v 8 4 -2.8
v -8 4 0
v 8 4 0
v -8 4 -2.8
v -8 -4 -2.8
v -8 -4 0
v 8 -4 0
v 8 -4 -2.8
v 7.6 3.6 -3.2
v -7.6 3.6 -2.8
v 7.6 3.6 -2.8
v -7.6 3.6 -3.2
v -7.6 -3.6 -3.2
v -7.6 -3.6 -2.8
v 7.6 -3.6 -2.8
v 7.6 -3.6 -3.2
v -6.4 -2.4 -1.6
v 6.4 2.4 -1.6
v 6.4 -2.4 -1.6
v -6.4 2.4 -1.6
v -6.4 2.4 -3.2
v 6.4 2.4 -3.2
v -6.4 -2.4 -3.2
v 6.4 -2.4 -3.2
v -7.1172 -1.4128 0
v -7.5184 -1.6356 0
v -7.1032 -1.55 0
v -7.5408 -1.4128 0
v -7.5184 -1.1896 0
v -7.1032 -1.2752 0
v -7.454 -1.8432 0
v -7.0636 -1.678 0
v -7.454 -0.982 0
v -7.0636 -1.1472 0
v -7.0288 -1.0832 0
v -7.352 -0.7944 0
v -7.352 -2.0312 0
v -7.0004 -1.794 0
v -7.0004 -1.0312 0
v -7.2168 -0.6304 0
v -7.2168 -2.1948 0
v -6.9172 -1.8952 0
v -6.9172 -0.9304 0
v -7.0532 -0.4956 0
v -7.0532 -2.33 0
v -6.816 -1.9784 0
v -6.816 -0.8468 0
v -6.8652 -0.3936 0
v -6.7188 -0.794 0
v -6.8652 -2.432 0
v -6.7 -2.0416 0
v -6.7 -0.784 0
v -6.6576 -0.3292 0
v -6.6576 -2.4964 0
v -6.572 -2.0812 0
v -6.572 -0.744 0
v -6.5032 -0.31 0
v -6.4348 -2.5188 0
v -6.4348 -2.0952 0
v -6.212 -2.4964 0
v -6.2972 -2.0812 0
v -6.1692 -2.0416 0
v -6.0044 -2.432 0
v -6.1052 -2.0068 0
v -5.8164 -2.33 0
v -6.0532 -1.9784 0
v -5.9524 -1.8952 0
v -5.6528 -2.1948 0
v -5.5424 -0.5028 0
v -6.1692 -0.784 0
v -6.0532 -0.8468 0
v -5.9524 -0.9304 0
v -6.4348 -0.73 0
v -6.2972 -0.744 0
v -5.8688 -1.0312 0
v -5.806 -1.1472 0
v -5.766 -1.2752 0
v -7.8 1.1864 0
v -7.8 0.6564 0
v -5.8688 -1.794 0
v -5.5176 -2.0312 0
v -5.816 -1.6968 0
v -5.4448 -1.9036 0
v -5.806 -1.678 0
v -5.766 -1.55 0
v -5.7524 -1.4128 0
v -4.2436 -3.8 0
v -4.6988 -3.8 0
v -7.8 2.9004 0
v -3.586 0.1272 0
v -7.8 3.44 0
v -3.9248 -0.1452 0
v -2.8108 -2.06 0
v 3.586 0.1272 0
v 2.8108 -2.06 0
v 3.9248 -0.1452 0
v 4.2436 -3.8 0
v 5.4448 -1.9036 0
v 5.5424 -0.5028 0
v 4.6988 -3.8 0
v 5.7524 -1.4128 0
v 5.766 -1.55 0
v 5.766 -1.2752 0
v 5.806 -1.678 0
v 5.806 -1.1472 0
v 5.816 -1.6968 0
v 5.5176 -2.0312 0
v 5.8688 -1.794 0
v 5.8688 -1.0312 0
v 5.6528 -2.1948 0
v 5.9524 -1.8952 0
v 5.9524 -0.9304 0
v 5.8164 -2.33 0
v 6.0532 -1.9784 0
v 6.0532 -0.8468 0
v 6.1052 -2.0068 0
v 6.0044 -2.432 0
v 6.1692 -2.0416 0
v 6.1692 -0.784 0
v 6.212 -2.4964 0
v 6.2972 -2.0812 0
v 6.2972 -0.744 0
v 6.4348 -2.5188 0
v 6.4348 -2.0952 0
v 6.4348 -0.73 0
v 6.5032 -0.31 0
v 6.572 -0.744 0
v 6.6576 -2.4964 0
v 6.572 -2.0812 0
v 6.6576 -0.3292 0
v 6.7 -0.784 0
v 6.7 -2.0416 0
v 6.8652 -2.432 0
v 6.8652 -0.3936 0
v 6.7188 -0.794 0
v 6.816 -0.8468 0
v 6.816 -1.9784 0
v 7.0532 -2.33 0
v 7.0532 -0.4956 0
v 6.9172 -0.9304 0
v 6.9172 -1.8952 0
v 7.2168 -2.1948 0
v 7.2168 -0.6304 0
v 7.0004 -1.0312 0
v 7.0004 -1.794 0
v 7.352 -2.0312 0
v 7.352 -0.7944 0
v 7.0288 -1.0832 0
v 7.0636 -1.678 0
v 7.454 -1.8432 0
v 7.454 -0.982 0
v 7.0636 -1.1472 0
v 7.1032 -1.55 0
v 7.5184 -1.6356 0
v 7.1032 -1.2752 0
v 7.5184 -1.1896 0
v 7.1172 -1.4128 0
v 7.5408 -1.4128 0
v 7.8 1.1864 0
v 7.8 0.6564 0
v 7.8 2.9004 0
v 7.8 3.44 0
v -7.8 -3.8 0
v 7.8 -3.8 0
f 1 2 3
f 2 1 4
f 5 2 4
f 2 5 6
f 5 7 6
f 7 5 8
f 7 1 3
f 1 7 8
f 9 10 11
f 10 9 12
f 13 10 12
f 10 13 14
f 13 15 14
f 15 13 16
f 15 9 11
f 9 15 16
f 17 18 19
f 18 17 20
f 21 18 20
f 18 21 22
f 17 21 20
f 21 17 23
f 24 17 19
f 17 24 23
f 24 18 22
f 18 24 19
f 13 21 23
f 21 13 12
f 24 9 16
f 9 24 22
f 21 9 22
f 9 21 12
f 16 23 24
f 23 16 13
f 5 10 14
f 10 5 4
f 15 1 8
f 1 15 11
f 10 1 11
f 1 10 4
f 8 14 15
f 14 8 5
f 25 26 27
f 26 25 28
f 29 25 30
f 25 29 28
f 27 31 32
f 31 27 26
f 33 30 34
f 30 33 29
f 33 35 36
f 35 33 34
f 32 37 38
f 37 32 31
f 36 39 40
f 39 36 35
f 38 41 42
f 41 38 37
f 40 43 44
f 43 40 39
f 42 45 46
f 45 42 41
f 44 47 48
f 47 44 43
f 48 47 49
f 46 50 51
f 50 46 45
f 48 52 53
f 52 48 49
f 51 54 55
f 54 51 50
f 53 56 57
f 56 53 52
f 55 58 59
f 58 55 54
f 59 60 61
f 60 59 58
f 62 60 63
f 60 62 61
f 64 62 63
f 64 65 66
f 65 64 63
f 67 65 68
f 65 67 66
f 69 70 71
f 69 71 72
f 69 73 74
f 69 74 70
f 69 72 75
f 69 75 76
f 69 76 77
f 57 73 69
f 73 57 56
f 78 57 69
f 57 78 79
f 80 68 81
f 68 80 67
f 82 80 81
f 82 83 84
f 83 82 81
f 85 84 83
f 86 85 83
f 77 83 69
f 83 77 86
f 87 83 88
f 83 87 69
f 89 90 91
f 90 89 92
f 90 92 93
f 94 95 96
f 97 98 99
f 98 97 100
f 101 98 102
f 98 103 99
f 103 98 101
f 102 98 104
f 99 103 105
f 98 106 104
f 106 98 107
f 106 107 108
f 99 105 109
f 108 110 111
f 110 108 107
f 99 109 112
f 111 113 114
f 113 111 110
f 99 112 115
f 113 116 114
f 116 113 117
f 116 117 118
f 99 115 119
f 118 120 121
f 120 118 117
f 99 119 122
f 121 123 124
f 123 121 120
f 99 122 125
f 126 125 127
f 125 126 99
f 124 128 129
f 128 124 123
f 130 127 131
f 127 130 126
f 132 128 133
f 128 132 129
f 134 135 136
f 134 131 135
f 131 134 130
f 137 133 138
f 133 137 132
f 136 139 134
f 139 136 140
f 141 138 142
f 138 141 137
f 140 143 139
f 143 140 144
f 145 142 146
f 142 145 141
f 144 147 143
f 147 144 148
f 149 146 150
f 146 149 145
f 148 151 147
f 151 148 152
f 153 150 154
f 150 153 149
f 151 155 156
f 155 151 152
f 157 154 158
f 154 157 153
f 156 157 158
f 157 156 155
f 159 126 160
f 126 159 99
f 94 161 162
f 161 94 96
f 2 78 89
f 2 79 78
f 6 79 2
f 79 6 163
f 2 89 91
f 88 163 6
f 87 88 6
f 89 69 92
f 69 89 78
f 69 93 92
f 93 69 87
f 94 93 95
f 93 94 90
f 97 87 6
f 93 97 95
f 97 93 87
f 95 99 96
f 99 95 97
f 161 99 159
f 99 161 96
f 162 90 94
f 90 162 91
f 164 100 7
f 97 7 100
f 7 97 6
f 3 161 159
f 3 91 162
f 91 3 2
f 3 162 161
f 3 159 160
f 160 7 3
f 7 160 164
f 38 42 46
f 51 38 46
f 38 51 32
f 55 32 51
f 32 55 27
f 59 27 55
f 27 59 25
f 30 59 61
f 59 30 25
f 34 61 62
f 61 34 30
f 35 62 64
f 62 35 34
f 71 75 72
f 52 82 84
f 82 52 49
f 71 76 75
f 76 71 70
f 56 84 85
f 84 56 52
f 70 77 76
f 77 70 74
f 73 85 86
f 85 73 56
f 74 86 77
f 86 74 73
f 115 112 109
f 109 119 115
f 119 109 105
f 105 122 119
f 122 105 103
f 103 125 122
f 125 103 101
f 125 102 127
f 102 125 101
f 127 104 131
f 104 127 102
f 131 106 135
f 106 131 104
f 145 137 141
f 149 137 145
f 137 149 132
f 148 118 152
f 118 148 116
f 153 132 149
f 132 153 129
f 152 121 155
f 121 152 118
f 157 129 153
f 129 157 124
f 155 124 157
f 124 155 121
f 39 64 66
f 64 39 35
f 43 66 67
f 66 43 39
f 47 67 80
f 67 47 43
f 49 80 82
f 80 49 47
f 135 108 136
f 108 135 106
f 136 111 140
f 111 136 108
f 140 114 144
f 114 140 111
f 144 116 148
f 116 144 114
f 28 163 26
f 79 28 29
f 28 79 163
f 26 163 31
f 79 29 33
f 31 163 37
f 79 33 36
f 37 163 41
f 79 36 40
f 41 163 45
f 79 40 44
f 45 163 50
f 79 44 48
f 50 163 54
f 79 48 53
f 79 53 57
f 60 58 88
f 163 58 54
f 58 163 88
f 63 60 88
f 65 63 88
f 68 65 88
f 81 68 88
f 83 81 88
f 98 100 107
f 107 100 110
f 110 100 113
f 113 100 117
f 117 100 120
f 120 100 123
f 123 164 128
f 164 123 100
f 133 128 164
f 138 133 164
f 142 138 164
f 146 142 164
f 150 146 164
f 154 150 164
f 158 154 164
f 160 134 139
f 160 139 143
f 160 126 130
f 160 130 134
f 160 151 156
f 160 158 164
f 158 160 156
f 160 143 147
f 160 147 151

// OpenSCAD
// file: ../p/box5.scad
use <../lib.scad>
function ldraw_lib__box5() = [
// 0 Box with 5 Faces and All Edges
// 0 Name: box5.dat
// 0 Author: James Jessiman
// 0 !LDRAW_ORG Primitive UPDATE 2012-01
// 0 !LICENSE Licensed under CC BY 2.0 and CC BY 4.0 : see CAreadme.txt
// 
// 0 BFC CERTIFY CCW
  [0,"BFC","CERTIFY"],
  [0,"BFC","CCW"],
// 
// 0 !HISTORY 2002-04-03 [sbliss] Modified for BFC compliance
// 0 !HISTORY 2002-04-25 [PTadmin] Official Update 2002-02
// 0 !HISTORY 2007-06-24 [PTadmin] Header formatted for Contributor Agreement
// 0 !HISTORY 2008-07-01 [PTadmin] Official Update 2008-01
// 0 !HISTORY 2012-02-16 [Philo] Changed to CCW
// 0 !HISTORY 2012-03-30 [PTadmin] Official Update 2012-01
// 
// 
// 2 24 1 1 1 -1 1 1
  [2,24,1,1,1,-1,1,1],
// 2 24 -1 1 1 -1 1 -1
  [2,24,-1,1,1,-1,1,-1],
// 2 24 -1 1 -1 1 1 -1
  [2,24,-1,1,-1,1,1,-1],
// 2 24 1 1 -1 1 1 1
  [2,24,1,1,-1,1,1,1],
// 2 24 1 0 1 -1 0 1
  [2,24,1,0,1,-1,0,1],
// 2 24 -1 0 1 -1 0 -1
  [2,24,-1,0,1,-1,0,-1],
// 2 24 -1 0 -1 1 0 -1
  [2,24,-1,0,-1,1,0,-1],
// 2 24 1 0 -1 1 0 1
  [2,24,1,0,-1,1,0,1],
// 2 24 1 0 1 1 1 1
  [2,24,1,0,1,1,1,1],
// 2 24 -1 0 1 -1 1 1
  [2,24,-1,0,1,-1,1,1],
// 2 24 1 0 -1 1 1 -1
  [2,24,1,0,-1,1,1,-1],
// 2 24 -1 0 -1 -1 1 -1
  [2,24,-1,0,-1,-1,1,-1],
// 4 16 -1 1 1 1 1 1 1 1 -1 -1 1 -1
  [4,16,-1,1,1,1,1,1,1,1,-1,-1,1,-1],
// 4 16 -1 1 1 -1 0 1 1 0 1 1 1 1
  [4,16,-1,1,1,-1,0,1,1,0,1,1,1,1],
// 4 16 -1 1 -1 -1 0 -1 -1 0 1 -1 1 1
  [4,16,-1,1,-1,-1,0,-1,-1,0,1,-1,1,1],
// 4 16 1 1 -1 1 0 -1 -1 0 -1 -1 1 -1
  [4,16,1,1,-1,1,0,-1,-1,0,-1,-1,1,-1],
// 4 16 1 1 1 1 0 1 1 0 -1 1 1 -1
  [4,16,1,1,1,1,0,1,1,0,-1,1,1,-1],
];
makepoly(ldraw_lib__box5(), line=0.2);
// file: ../p/box4.scad
use <../lib.scad>
function ldraw_lib__box4() = [
// 0 Box with 4 Faces (2 Parallel Pairs) and All Edges
// 0 Name: box4.dat
// 0 Author: James Jessiman
// 0 !LDRAW_ORG Primitive UPDATE 2012-01
// 0 !LICENSE Licensed under CC BY 2.0 and CC BY 4.0 : see CAreadme.txt
// 
// 0 BFC CERTIFY CCW
  [0,"BFC","CERTIFY"],
  [0,"BFC","CCW"],
// 
// 0 !HISTORY 2002-04-03 [sbliss] Modified for BFC compliance
// 0 !HISTORY 2002-04-25 [PTadmin] Official Update 2002-02
// 0 !HISTORY 2007-06-24 [PTadmin] Header formatted for Contributor Agreement
// 0 !HISTORY 2008-07-01 [PTadmin] Official Update 2008-01
// 0 !HISTORY 2012-02-16 [Philo] Changed to CCW
// 0 !HISTORY 2012-03-30 [PTadmin] Official Update 2012-01
// 
// 
// 2 24 1 1 1 -1 1 1
  [2,24,1,1,1,-1,1,1],
// 2 24 -1 1 1 -1 1 -1
  [2,24,-1,1,1,-1,1,-1],
// 2 24 -1 1 -1 1 1 -1
  [2,24,-1,1,-1,1,1,-1],
// 2 24 1 1 -1 1 1 1
  [2,24,1,1,-1,1,1,1],
// 2 24 1 0 1 -1 0 1
  [2,24,1,0,1,-1,0,1],
// 2 24 -1 0 1 -1 0 -1
  [2,24,-1,0,1,-1,0,-1],
// 2 24 -1 0 -1 1 0 -1
  [2,24,-1,0,-1,1,0,-1],
// 2 24 1 0 -1 1 0 1
  [2,24,1,0,-1,1,0,1],
// 2 24 1 0 1 1 1 1
  [2,24,1,0,1,1,1,1],
// 2 24 -1 0 1 -1 1 1
  [2,24,-1,0,1,-1,1,1],
// 2 24 1 0 -1 1 1 -1
  [2,24,1,0,-1,1,1,-1],
// 2 24 -1 0 -1 -1 1 -1
  [2,24,-1,0,-1,-1,1,-1],
// 4 16 -1 1 1 -1 0 1 1 0 1 1 1 1
  [4,16,-1,1,1,-1,0,1,1,0,1,1,1,1],
// 4 16 -1 1 -1 -1 0 -1 -1 0 1 -1 1 1
  [4,16,-1,1,-1,-1,0,-1,-1,0,1,-1,1,1],
// 4 16 1 1 -1 1 0 -1 -1 0 -1 -1 1 -1
  [4,16,1,1,-1,1,0,-1,-1,0,-1,-1,1,-1],
// 4 16 1 1 1 1 0 1 1 0 -1 1 1 -1
  [4,16,1,1,1,1,0,1,1,0,-1,1,1,-1],
];
makepoly(ldraw_lib__box4(), line=0.2);
// file: s/3069bs01.scad
use <../../lib.scad>
use <../../p/box4.scad>
use <../../p/box5.scad>
function ldraw_lib__s__3069bs01() = [
// 0 ~Tile  1 x  2 with Groove without Top Face
// 0 Name: s\3069bs01.dat
// 0 Author: Santeri Piippo [arezey]
// 0 !LDRAW_ORG Subpart UPDATE 2010-02
// 0 !LICENSE Licensed under CC BY 2.0 and CC BY 4.0 : see CAreadme.txt
// 
// 0 BFC CERTIFY CCW
  [0,"BFC","CERTIFY"],
  [0,"BFC","CCW"],
// 
// 0 !HISTORY 2010-07-05 [PTadmin] Official Update 2010-02
// 
// 
// 1 16 0 0 0 20 0 0 0 7 0 0 0 10 box4.dat
  [1,16,0,0,0,20,0,0,0,7,0,0,0,10, ldraw_lib__box4()],
// 1 16 0 7 0 19 0 0 0 1 0 0 0 9 box4.dat
  [1,16,0,7,0,19,0,0,0,1,0,0,0,9, ldraw_lib__box4()],
// 0 BFC INVERTNEXT
  [0,"BFC","INVERTNEXT"],
// 1 16 0 8 0 16 0 0 0 -4 0 0 0 6 box5.dat
  [1,16,0,8,0,16,0,0,0,-4,0,0,0,6, ldraw_lib__box5()],
// 4 16 -19 8 9 -16 8 6 -16 8 -6 -19 8 -9
  [4,16,-19,8,9,-16,8,6,-16,8,-6,-19,8,-9],
// 4 16 19 8 -9 16 8 -6 16 8 6 19 8 9
  [4,16,19,8,-9,16,8,-6,16,8,6,19,8,9],
// 4 16 19 8 9 16 8 6 -16 8 6 -19 8 9
  [4,16,19,8,9,16,8,6,-16,8,6,-19,8,9],
// 4 16 -19 8 -9 -16 8 -6 16 8 -6 19 8 -9
  [4,16,-19,8,-9,-16,8,-6,16,8,-6,19,8,-9],
// 4 16 -20 7 10 -19 7 9 -19 7 -9 -20 7 -10
  [4,16,-20,7,10,-19,7,9,-19,7,-9,-20,7,-10],
// 4 16 20 7 -10 19 7 -9 19 7 9 20 7 10
  [4,16,20,7,-10,19,7,-9,19,7,9,20,7,10],
// 4 16 20 7 10 19 7 9 -19 7 9 -20 7 10
  [4,16,20,7,10,19,7,9,-19,7,9,-20,7,10],
// 4 16 -20 7 -10 -19 7 -9 19 7 -9 20 7 -10
  [4,16,-20,7,-10,-19,7,-9,19,7,-9,20,7,-10],
// 0 //
];
makepoly(ldraw_lib__s__3069bs01(), line=0.2);
// main file
use <../lib.scad>
use <s/3069bs01.scad>
function ldraw_lib__3069bpz0() = [
// 0 Tile  1 x  2 with Black Lines and Medium Azure and White Circles on Silver Pattern
// 0 Name: 3069bpz0.dat
// 0 Author: Damien Roux [Darats]
// 0 !LDRAW_ORG Part UPDATE 2017-01
// 0 !LICENSE Licensed under CC BY 2.0 and CC BY 4.0 : see CAreadme.txt
// 
// 0 BFC CERTIFY CCW
  [0,"BFC","CERTIFY"],
  [0,"BFC","CCW"],
// 
// 0 !KEYWORDS Brickheadz, BrickLink 3069bpb557, Iron Man, Set 41590
// 
// 0 !HISTORY 2017-12-30 [PTadmin] Official Update 2017-01
// 
// 
// 1 16 0 0 0 1 0 0 0 1 0 0 0 1 s\3069bs01.dat
  [1,16,0,0,0,1,0,0,0,1,0,0,0,1, ldraw_lib__s__3069bs01()],
// 4 0 -17.758 0 -3.875 -17.793 0 -3.532 -18.852 0 -3.532 -18.796 0 -4.089
  [4,0,-17.758,0,-3.875,-17.793,0,-3.532,-18.852,0,-3.532,-18.796,0,-4.089],
// 4 0 -18.796 0 -2.974 -18.852 0 -3.532 -17.793 0 -3.532 -17.758 0 -3.188
  [4,0,-18.796,0,-2.974,-18.852,0,-3.532,-17.793,0,-3.532,-17.758,0,-3.188],
// 4 0 -17.659 0 -4.195 -17.758 0 -3.875 -18.796 0 -4.089 -18.635 0 -4.608
  [4,0,-17.659,0,-4.195,-17.758,0,-3.875,-18.796,0,-4.089,-18.635,0,-4.608],
// 4 0 -18.635 0 -2.455 -18.796 0 -2.974 -17.758 0 -3.188 -17.659 0 -2.868
  [4,0,-18.635,0,-2.455,-18.796,0,-2.974,-17.758,0,-3.188,-17.659,0,-2.868],
// 4 0 -18.38 0 -1.986 -18.635 0 -2.455 -17.659 0 -2.868 -17.572 0 -2.708
  [4,0,-18.38,0,-1.986,-18.635,0,-2.455,-17.659,0,-2.868,-17.572,0,-2.708],
// 4 0 -17.501 0 -4.485 -17.659 0 -4.195 -18.635 0 -4.608 -18.38 0 -5.078
  [4,0,-17.501,0,-4.485,-17.659,0,-4.195,-18.635,0,-4.608,-18.38,0,-5.078],
// 4 0 -18.38 0 -1.986 -17.572 0 -2.708 -17.501 0 -2.578 -18.042 0 -1.576
  [4,0,-18.38,0,-1.986,-17.572,0,-2.708,-17.501,0,-2.578,-18.042,0,-1.576],
// 4 0 -17.293 0 -4.738 -17.501 0 -4.485 -18.38 0 -5.078 -18.042 0 -5.487
  [4,0,-17.293,0,-4.738,-17.501,0,-4.485,-18.38,0,-5.078,-18.042,0,-5.487],
// 4 0 -18.042 0 -1.576 -17.501 0 -2.578 -17.293 0 -2.326 -17.633 0 -1.239
  [4,0,-18.042,0,-1.576,-17.501,0,-2.578,-17.293,0,-2.326,-17.633,0,-1.239],
// 4 0 -17.04 0 -4.946 -17.293 0 -4.738 -18.042 0 -5.487 -17.633 0 -5.825
  [4,0,-17.04,0,-4.946,-17.293,0,-4.738,-18.042,0,-5.487,-17.633,0,-5.825],
// 4 0 -17.633 0 -1.239 -17.293 0 -2.326 -17.04 0 -2.117 -17.163 0 -0.984
  [4,0,-17.633,0,-1.239,-17.293,0,-2.326,-17.04,0,-2.117,-17.163,0,-0.984],
// 3 0 -17.163 0 -0.984 -17.04 0 -2.117 -16.797 0 -1.985
  [3,0,-17.163,0,-0.984,-17.04,0,-2.117,-16.797,0,-1.985],
// 4 0 -16.75 0 -5.104 -17.04 0 -4.946 -17.633 0 -5.825 -17.163 0 -6.08
  [4,0,-16.75,0,-5.104,-17.04,0,-4.946,-17.633,0,-5.825,-17.163,0,-6.08],
// 4 0 -17.163 0 -0.984 -16.797 0 -1.985 -16.75 0 -1.96 -16.644 0 -0.823
  [4,0,-17.163,0,-0.984,-16.797,0,-1.985,-16.75,0,-1.96,-16.644,0,-0.823],
// 4 0 -16.43 0 -5.203 -16.75 0 -5.104 -17.163 0 -6.08 -16.644 0 -6.241
  [4,0,-16.43,0,-5.203,-16.75,0,-5.104,-17.163,0,-6.08,-16.644,0,-6.241],
// 4 0 -16.644 0 -0.823 -16.75 0 -1.96 -16.43 0 -1.86 -16.258 0 -0.775
  [4,0,-16.644,0,-0.823,-16.75,0,-1.96,-16.43,0,-1.86,-16.258,0,-0.775],
// 4 0 -16.087 0 -5.238 -16.43 0 -5.203 -16.644 0 -6.241 -16.087 0 -6.297
  [4,0,-16.087,0,-5.238,-16.43,0,-5.203,-16.644,0,-6.241,-16.087,0,-6.297],
// 4 0 -15.743 0 -5.203 -16.087 0 -5.238 -16.087 0 -6.297 -15.53 0 -6.241
  [4,0,-15.743,0,-5.203,-16.087,0,-5.238,-16.087,0,-6.297,-15.53,0,-6.241],
// 4 0 -15.423 0 -5.104 -15.743 0 -5.203 -15.53 0 -6.241 -15.011 0 -6.08
  [4,0,-15.423,0,-5.104,-15.743,0,-5.203,-15.53,0,-6.241,-15.011,0,-6.08],
// 3 0 -15.263 0 -5.017 -15.423 0 -5.104 -15.011 0 -6.08
  [3,0,-15.263,0,-5.017,-15.423,0,-5.104,-15.011,0,-6.08],
// 4 0 -15.133 0 -4.946 -15.263 0 -5.017 -15.011 0 -6.08 -14.541 0 -5.825
  [4,0,-15.133,0,-4.946,-15.263,0,-5.017,-15.011,0,-6.08,-14.541,0,-5.825],
// 4 0 -14.881 0 -4.738 -15.133 0 -4.946 -14.541 0 -5.825 -14.132 0 -5.487
  [4,0,-14.881,0,-4.738,-15.133,0,-4.946,-14.541,0,-5.825,-14.132,0,-5.487],
// 3 0 -13.856 0 -1.257 -15.423 0 -1.96 -15.133 0 -2.117
  [3,0,-13.856,0,-1.257,-15.423,0,-1.96,-15.133,0,-2.117],
// 3 0 -13.856 0 -1.257 -15.133 0 -2.117 -14.881 0 -2.326
  [3,0,-13.856,0,-1.257,-15.133,0,-2.117,-14.881,0,-2.326],
// 3 0 -13.856 0 -1.257 -16.087 0 -1.825 -15.743 0 -1.86
  [3,0,-13.856,0,-1.257,-16.087,0,-1.825,-15.743,0,-1.86],
// 3 0 -13.856 0 -1.257 -15.743 0 -1.86 -15.423 0 -1.96
  [3,0,-13.856,0,-1.257,-15.743,0,-1.86,-15.423,0,-1.96],
// 3 0 -13.856 0 -1.257 -14.881 0 -2.326 -14.672 0 -2.578
  [3,0,-13.856,0,-1.257,-14.881,0,-2.326,-14.672,0,-2.578],
// 3 0 -13.856 0 -1.257 -14.672 0 -2.578 -14.515 0 -2.868
  [3,0,-13.856,0,-1.257,-14.672,0,-2.578,-14.515,0,-2.868],
// 3 0 -13.856 0 -1.257 -14.515 0 -2.868 -14.415 0 -3.188
  [3,0,-13.856,0,-1.257,-14.515,0,-2.868,-14.415,0,-3.188],
// 4 0 -16.258 0 -0.775 -16.43 0 -1.86 -16.087 0 -1.825 -13.856 0 -1.257
  [4,0,-16.258,0,-0.775,-16.43,0,-1.86,-16.087,0,-1.825,-13.856,0,-1.257],
// 4 0 -16.258 0 -0.775 -13.856 0 -1.257 -19.5 0 2.966 -19.5 0 1.641
  [4,0,-16.258,0,-0.775,-13.856,0,-1.257,-19.5,0,2.966,-19.5,0,1.641],
// 4 0 -14.672 0 -4.485 -14.881 0 -4.738 -14.132 0 -5.487 -13.794 0 -5.078
  [4,0,-14.672,0,-4.485,-14.881,0,-4.738,-14.132,0,-5.487,-13.794,0,-5.078],
// 3 0 -14.54 0 -4.242 -14.672 0 -4.485 -13.794 0 -5.078
  [3,0,-14.54,0,-4.242,-14.672,0,-4.485,-13.794,0,-5.078],
// 4 0 -14.515 0 -4.195 -14.54 0 -4.242 -13.794 0 -5.078 -13.612 0 -4.759
  [4,0,-14.515,0,-4.195,-14.54,0,-4.242,-13.794,0,-5.078,-13.612,0,-4.759],
// 3 0 -14.415 0 -3.875 -14.515 0 -4.195 -13.612 0 -4.759
  [3,0,-14.415,0,-3.875,-14.515,0,-4.195,-13.612,0,-4.759],
// 3 0 -14.381 0 -3.532 -14.415 0 -3.875 -13.612 0 -4.759
  [3,0,-14.381,0,-3.532,-14.415,0,-3.875,-13.612,0,-4.759],
// 4 0 -13.856 0 -1.257 -14.415 0 -3.188 -14.381 0 -3.532 -13.612 0 -4.759
  [4,0,-13.856,0,-1.257,-14.415,0,-3.188,-14.381,0,-3.532,-13.612,0,-4.759],
// 4 0 -10.609 0 -9.5 -13.856 0 -1.257 -13.612 0 -4.759 -11.747 0 -9.5
  [4,0,-10.609,0,-9.5,-13.856,0,-1.257,-13.612,0,-4.759,-11.747,0,-9.5],
// 4 0 -9.812 0 -0.363 -8.965 0 0.318 -19.5 0 8.6 -19.5 0 7.251
  [4,0,-9.812,0,-0.363,-8.965,0,0.318,-19.5,0,8.6,-19.5,0,7.251],
// 3 0 -8.965 0 0.318 -9.812 0 -0.363 -7.027 0 -5.15
  [3,0,-8.965,0,0.318,-9.812,0,-0.363,-7.027,0,-5.15],
// 3 0 8.965 0 0.318 7.027 0 -5.15 9.812 0 -0.363
  [3,0,8.965,0,0.318,7.027,0,-5.15,9.812,0,-0.363],
// 4 0 13.612 0 -4.759 13.856 0 -1.257 10.609 0 -9.5 11.747 0 -9.5
  [4,0,13.612,0,-4.759,13.856,0,-1.257,10.609,0,-9.5,11.747,0,-9.5],
// 3 0 14.381 0 -3.532 13.612 0 -4.759 14.415 0 -3.875
  [3,0,14.381,0,-3.532,13.612,0,-4.759,14.415,0,-3.875],
// 4 0 14.381 0 -3.532 14.415 0 -3.188 13.856 0 -1.257 13.612 0 -4.759
  [4,0,14.381,0,-3.532,14.415,0,-3.188,13.856,0,-1.257,13.612,0,-4.759],
// 3 0 14.415 0 -3.875 13.612 0 -4.759 14.515 0 -4.195
  [3,0,14.415,0,-3.875,13.612,0,-4.759,14.515,0,-4.195],
// 3 0 13.856 0 -1.257 14.415 0 -3.188 14.515 0 -2.868
  [3,0,13.856,0,-1.257,14.415,0,-3.188,14.515,0,-2.868],
// 4 0 13.794 0 -5.078 14.54 0 -4.242 14.515 0 -4.195 13.612 0 -4.759
  [4,0,13.794,0,-5.078,14.54,0,-4.242,14.515,0,-4.195,13.612,0,-4.759],
// 3 0 14.54 0 -4.242 13.794 0 -5.078 14.672 0 -4.485
  [3,0,14.54,0,-4.242,13.794,0,-5.078,14.672,0,-4.485],
// 3 0 13.856 0 -1.257 14.515 0 -2.868 14.672 0 -2.578
  [3,0,13.856,0,-1.257,14.515,0,-2.868,14.672,0,-2.578],
// 4 0 14.132 0 -5.487 14.881 0 -4.738 14.672 0 -4.485 13.794 0 -5.078
  [4,0,14.132,0,-5.487,14.881,0,-4.738,14.672,0,-4.485,13.794,0,-5.078],
// 3 0 13.856 0 -1.257 14.672 0 -2.578 14.881 0 -2.326
  [3,0,13.856,0,-1.257,14.672,0,-2.578,14.881,0,-2.326],
// 4 0 14.541 0 -5.825 15.133 0 -4.946 14.881 0 -4.738 14.132 0 -5.487
  [4,0,14.541,0,-5.825,15.133,0,-4.946,14.881,0,-4.738,14.132,0,-5.487],
// 3 0 13.856 0 -1.257 14.881 0 -2.326 15.133 0 -2.117
  [3,0,13.856,0,-1.257,14.881,0,-2.326,15.133,0,-2.117],
// 4 0 15.011 0 -6.08 15.263 0 -5.017 15.133 0 -4.946 14.541 0 -5.825
  [4,0,15.011,0,-6.08,15.263,0,-5.017,15.133,0,-4.946,14.541,0,-5.825],
// 3 0 15.263 0 -5.017 15.011 0 -6.08 15.423 0 -5.104
  [3,0,15.263,0,-5.017,15.011,0,-6.08,15.423,0,-5.104],
// 3 0 13.856 0 -1.257 15.133 0 -2.117 15.423 0 -1.96
  [3,0,13.856,0,-1.257,15.133,0,-2.117,15.423,0,-1.96],
// 4 0 15.53 0 -6.241 15.743 0 -5.203 15.423 0 -5.104 15.011 0 -6.08
  [4,0,15.53,0,-6.241,15.743,0,-5.203,15.423,0,-5.104,15.011,0,-6.08],
// 3 0 13.856 0 -1.257 15.423 0 -1.96 15.743 0 -1.86
  [3,0,13.856,0,-1.257,15.423,0,-1.96,15.743,0,-1.86],
// 4 0 16.087 0 -6.297 16.087 0 -5.238 15.743 0 -5.203 15.53 0 -6.241
  [4,0,16.087,0,-6.297,16.087,0,-5.238,15.743,0,-5.203,15.53,0,-6.241],
// 3 0 13.856 0 -1.257 15.743 0 -1.86 16.087 0 -1.825
  [3,0,13.856,0,-1.257,15.743,0,-1.86,16.087,0,-1.825],
// 4 0 16.087 0 -1.825 16.43 0 -1.86 16.258 0 -0.775 13.856 0 -1.257
  [4,0,16.087,0,-1.825,16.43,0,-1.86,16.258,0,-0.775,13.856,0,-1.257],
// 4 0 16.644 0 -6.241 16.43 0 -5.203 16.087 0 -5.238 16.087 0 -6.297
  [4,0,16.644,0,-6.241,16.43,0,-5.203,16.087,0,-5.238,16.087,0,-6.297],
// 4 0 16.43 0 -1.86 16.75 0 -1.96 16.644 0 -0.823 16.258 0 -0.775
  [4,0,16.43,0,-1.86,16.75,0,-1.96,16.644,0,-0.823,16.258,0,-0.775],
// 4 0 17.163 0 -6.08 16.75 0 -5.104 16.43 0 -5.203 16.644 0 -6.241
  [4,0,17.163,0,-6.08,16.75,0,-5.104,16.43,0,-5.203,16.644,0,-6.241],
// 3 0 17.163 0 -0.984 16.797 0 -1.985 17.04 0 -2.117
  [3,0,17.163,0,-0.984,16.797,0,-1.985,17.04,0,-2.117],
// 4 0 16.75 0 -1.96 16.797 0 -1.985 17.163 0 -0.984 16.644 0 -0.823
  [4,0,16.75,0,-1.96,16.797,0,-1.985,17.163,0,-0.984,16.644,0,-0.823],
// 4 0 17.633 0 -5.825 17.04 0 -4.946 16.75 0 -5.104 17.163 0 -6.08
  [4,0,17.633,0,-5.825,17.04,0,-4.946,16.75,0,-5.104,17.163,0,-6.08],
// 4 0 17.04 0 -2.117 17.293 0 -2.326 17.633 0 -1.239 17.163 0 -0.984
  [4,0,17.04,0,-2.117,17.293,0,-2.326,17.633,0,-1.239,17.163,0,-0.984],
// 4 0 18.042 0 -5.487 17.293 0 -4.738 17.04 0 -4.946 17.633 0 -5.825
  [4,0,18.042,0,-5.487,17.293,0,-4.738,17.04,0,-4.946,17.633,0,-5.825],
// 4 0 17.293 0 -2.326 17.501 0 -2.578 18.042 0 -1.576 17.633 0 -1.239
  [4,0,17.293,0,-2.326,17.501,0,-2.578,18.042,0,-1.576,17.633,0,-1.239],
// 4 0 18.38 0 -5.078 17.501 0 -4.485 17.293 0 -4.738 18.042 0 -5.487
  [4,0,18.38,0,-5.078,17.501,0,-4.485,17.293,0,-4.738,18.042,0,-5.487],
// 4 0 17.501 0 -2.578 17.572 0 -2.708 18.38 0 -1.986 18.042 0 -1.576
  [4,0,17.501,0,-2.578,17.572,0,-2.708,18.38,0,-1.986,18.042,0,-1.576],
// 4 0 18.635 0 -4.608 17.659 0 -4.195 17.501 0 -4.485 18.38 0 -5.078
  [4,0,18.635,0,-4.608,17.659,0,-4.195,17.501,0,-4.485,18.38,0,-5.078],
// 4 0 17.659 0 -2.868 18.635 0 -2.455 18.38 0 -1.986 17.572 0 -2.708
  [4,0,17.659,0,-2.868,18.635,0,-2.455,18.38,0,-1.986,17.572,0,-2.708],
// 4 0 18.796 0 -4.089 17.758 0 -3.875 17.659 0 -4.195 18.635 0 -4.608
  [4,0,18.796,0,-4.089,17.758,0,-3.875,17.659,0,-4.195,18.635,0,-4.608],
// 4 0 17.758 0 -3.188 18.796 0 -2.974 18.635 0 -2.455 17.659 0 -2.868
  [4,0,17.758,0,-3.188,18.796,0,-2.974,18.635,0,-2.455,17.659,0,-2.868],
// 4 0 18.852 0 -3.532 17.793 0 -3.532 17.758 0 -3.875 18.796 0 -4.089
  [4,0,18.852,0,-3.532,17.793,0,-3.532,17.758,0,-3.875,18.796,0,-4.089],
// 4 0 17.793 0 -3.532 18.852 0 -3.532 18.796 0 -2.974 17.758 0 -3.188
  [4,0,17.793,0,-3.532,18.852,0,-3.532,18.796,0,-2.974,17.758,0,-3.188],
// 4 0 19.5 0 2.966 13.856 0 -1.257 16.258 0 -0.775 19.5 0 1.641
  [4,0,19.5,0,2.966,13.856,0,-1.257,16.258,0,-0.775,19.5,0,1.641],
// 4 0 19.5 0 8.6 8.965 0 0.318 9.812 0 -0.363 19.5 0 7.251
  [4,0,19.5,0,8.6,8.965,0,0.318,9.812,0,-0.363,19.5,0,7.251],
// 3 16 -20 0 10 -19.5 0 2.966 -19.5 0 7.251
  [3,16,-20,0,10,-19.5,0,2.966,-19.5,0,7.251],
// 3 16 -20 0 10 -19.5 0 1.641 -19.5 0 2.966
  [3,16,-20,0,10,-19.5,0,1.641,-19.5,0,2.966],
// 4 16 -20 0 -10 -19.5 0 -9.5 -19.5 0 1.641 -20 0 10
  [4,16,-20,0,-10,-19.5,0,-9.5,-19.5,0,1.641,-20,0,10],
// 3 16 -20 0 10 -19.5 0 7.251 -19.5 0 8.6
  [3,16,-20,0,10,-19.5,0,7.251,-19.5,0,8.6],
// 3 16 -11.747 0 -9.5 -19.5 0 -9.5 -20 0 -10
  [3,16,-11.747,0,-9.5,-19.5,0,-9.5,-20,0,-10],
// 3 16 -10.609 0 -9.5 -11.747 0 -9.5 -20 0 -10
  [3,16,-10.609,0,-9.5,-11.747,0,-9.5,-20,0,-10],
// 4 16 -9.812 0 -0.363 -19.5 0 7.251 -19.5 0 2.966 -13.856 0 -1.257
  [4,16,-9.812,0,-0.363,-19.5,0,7.251,-19.5,0,2.966,-13.856,0,-1.257],
// 4 16 -7.027 0 -5.15 -9.812 0 -0.363 -13.856 0 -1.257 -10.609 0 -9.5
  [4,16,-7.027,0,-5.15,-9.812,0,-0.363,-13.856,0,-1.257,-10.609,0,-9.5],
// 4 16 8.965 0 0.318 -8.965 0 0.318 -7.027 0 -5.15 7.027 0 -5.15
  [4,16,8.965,0,0.318,-8.965,0,0.318,-7.027,0,-5.15,7.027,0,-5.15],
// 3 16 10.609 0 -9.5 -10.609 0 -9.5 -20 0 -10
  [3,16,10.609,0,-9.5,-10.609,0,-9.5,-20,0,-10],
// 4 16 7.027 0 -5.15 -7.027 0 -5.15 -10.609 0 -9.5 10.609 0 -9.5
  [4,16,7.027,0,-5.15,-7.027,0,-5.15,-10.609,0,-9.5,10.609,0,-9.5],
// 4 16 13.856 0 -1.257 9.812 0 -0.363 7.027 0 -5.15 10.609 0 -9.5
  [4,16,13.856,0,-1.257,9.812,0,-0.363,7.027,0,-5.15,10.609,0,-9.5],
// 4 16 19.5 0 2.966 19.5 0 7.251 9.812 0 -0.363 13.856 0 -1.257
  [4,16,19.5,0,2.966,19.5,0,7.251,9.812,0,-0.363,13.856,0,-1.257],
// 4 16 19.5 0 8.6 -19.5 0 8.6 -8.965 0 0.318 8.965 0 0.318
  [4,16,19.5,0,8.6,-19.5,0,8.6,-8.965,0,0.318,8.965,0,0.318],
// 3 16 19.5 0 -9.5 11.747 0 -9.5 20 0 -10
  [3,16,19.5,0,-9.5,11.747,0,-9.5,20,0,-10],
// 4 16 20 0 -10 11.747 0 -9.5 10.609 0 -9.5 -20 0 -10
  [4,16,20,0,-10,11.747,0,-9.5,10.609,0,-9.5,-20,0,-10],
// 3 16 20 0 10 19.5 0 7.251 19.5 0 2.966
  [3,16,20,0,10,19.5,0,7.251,19.5,0,2.966],
// 4 16 20 0 10 -20 0 10 -19.5 0 8.6 19.5 0 8.6
  [4,16,20,0,10,-20,0,10,-19.5,0,8.6,19.5,0,8.6],
// 3 16 20 0 10 19.5 0 8.6 19.5 0 7.251
  [3,16,20,0,10,19.5,0,8.6,19.5,0,7.251],
// 3 16 20 0 10 19.5 0 2.966 19.5 0 1.641
  [3,16,20,0,10,19.5,0,2.966,19.5,0,1.641],
// 4 16 19.5 0 1.641 19.5 0 -9.5 20 0 -10 20 0 10
  [4,16,19.5,0,1.641,19.5,0,-9.5,20,0,-10,20,0,10],
// 3 322 -17.501 0 -4.485 -17.293 0 -4.738 -17.04 0 -4.946
  [3,322,-17.501,0,-4.485,-17.293,0,-4.738,-17.04,0,-4.946],
// 4 322 -16.75 0 -5.104 -17.659 0 -4.195 -17.501 0 -4.485 -17.04 0 -4.946
  [4,322,-16.75,0,-5.104,-17.659,0,-4.195,-17.501,0,-4.485,-17.04,0,-4.946],
// 4 322 -16.43 0 -5.203 -17.758 0 -3.875 -17.659 0 -4.195 -16.75 0 -5.104
  [4,322,-16.43,0,-5.203,-17.758,0,-3.875,-17.659,0,-4.195,-16.75,0,-5.104],
// 4 322 -16.087 0 -5.238 -17.793 0 -3.532 -17.758 0 -3.875 -16.43 0 -5.203
  [4,322,-16.087,0,-5.238,-17.793,0,-3.532,-17.758,0,-3.875,-16.43,0,-5.203],
// 4 322 -15.743 0 -5.203 -17.758 0 -3.188 -17.793 0 -3.532 -16.087 0 -5.238
  [4,322,-15.743,0,-5.203,-17.758,0,-3.188,-17.793,0,-3.532,-16.087,0,-5.238],
// 4 322 -15.423 0 -5.104 -17.659 0 -2.868 -17.758 0 -3.188 -15.743 0 -5.203
  [4,322,-15.423,0,-5.104,-17.659,0,-2.868,-17.758,0,-3.188,-15.743,0,-5.203],
// 4 322 -15.263 0 -5.017 -17.572 0 -2.708 -17.659 0 -2.868 -15.423 0 -5.104
  [4,322,-15.263,0,-5.017,-17.572,0,-2.708,-17.659,0,-2.868,-15.423,0,-5.104],
// 3 322 -15.133 0 -2.117 -14.672 0 -2.578 -14.881 0 -2.326
  [3,322,-15.133,0,-2.117,-14.672,0,-2.578,-14.881,0,-2.326],
// 4 322 -16.75 0 -1.96 -16.797 0 -1.985 -14.54 0 -4.242 -14.515 0 -4.195
  [4,322,-16.75,0,-1.96,-16.797,0,-1.985,-14.54,0,-4.242,-14.515,0,-4.195],
// 4 322 -15.133 0 -2.117 -15.423 0 -1.96 -14.515 0 -2.868 -14.672 0 -2.578
  [4,322,-15.133,0,-2.117,-15.423,0,-1.96,-14.515,0,-2.868,-14.672,0,-2.578],
// 4 322 -16.43 0 -1.86 -16.75 0 -1.96 -14.515 0 -4.195 -14.415 0 -3.875
  [4,322,-16.43,0,-1.86,-16.75,0,-1.96,-14.515,0,-4.195,-14.415,0,-3.875],
// 4 322 -15.423 0 -1.96 -15.743 0 -1.86 -14.415 0 -3.188 -14.515 0 -2.868
  [4,322,-15.423,0,-1.96,-15.743,0,-1.86,-14.415,0,-3.188,-14.515,0,-2.868],
// 4 322 -16.087 0 -1.825 -16.43 0 -1.86 -14.415 0 -3.875 -14.381 0 -3.532
  [4,322,-16.087,0,-1.825,-16.43,0,-1.86,-14.415,0,-3.875,-14.381,0,-3.532],
// 4 322 -15.743 0 -1.86 -16.087 0 -1.825 -14.381 0 -3.532 -14.415 0 -3.188
  [4,322,-15.743,0,-1.86,-16.087,0,-1.825,-14.381,0,-3.532,-14.415,0,-3.188],
// 3 322 15.133 0 -2.117 14.881 0 -2.326 14.672 0 -2.578
  [3,322,15.133,0,-2.117,14.881,0,-2.326,14.672,0,-2.578],
// 4 322 14.515 0 -2.868 15.423 0 -1.96 15.133 0 -2.117 14.672 0 -2.578
  [4,322,14.515,0,-2.868,15.423,0,-1.96,15.133,0,-2.117,14.672,0,-2.578],
// 4 322 14.415 0 -3.188 15.743 0 -1.86 15.423 0 -1.96 14.515 0 -2.868
  [4,322,14.415,0,-3.188,15.743,0,-1.86,15.423,0,-1.96,14.515,0,-2.868],
// 4 322 14.381 0 -3.532 16.087 0 -1.825 15.743 0 -1.86 14.415 0 -3.188
  [4,322,14.381,0,-3.532,16.087,0,-1.825,15.743,0,-1.86,14.415,0,-3.188],
// 4 322 14.415 0 -3.875 16.43 0 -1.86 16.087 0 -1.825 14.381 0 -3.532
  [4,322,14.415,0,-3.875,16.43,0,-1.86,16.087,0,-1.825,14.381,0,-3.532],
// 4 322 14.515 0 -4.195 16.75 0 -1.96 16.43 0 -1.86 14.415 0 -3.875
  [4,322,14.515,0,-4.195,16.75,0,-1.96,16.43,0,-1.86,14.415,0,-3.875],
// 4 322 14.54 0 -4.242 16.797 0 -1.985 16.75 0 -1.96 14.515 0 -4.195
  [4,322,14.54,0,-4.242,16.797,0,-1.985,16.75,0,-1.96,14.515,0,-4.195],
// 3 322 17.501 0 -4.485 17.04 0 -4.946 17.293 0 -4.738
  [3,322,17.501,0,-4.485,17.04,0,-4.946,17.293,0,-4.738],
// 4 322 17.501 0 -4.485 17.659 0 -4.195 16.75 0 -5.104 17.04 0 -4.946
  [4,322,17.501,0,-4.485,17.659,0,-4.195,16.75,0,-5.104,17.04,0,-4.946],
// 4 322 17.659 0 -2.868 17.572 0 -2.708 15.263 0 -5.017 15.423 0 -5.104
  [4,322,17.659,0,-2.868,17.572,0,-2.708,15.263,0,-5.017,15.423,0,-5.104],
// 4 322 17.659 0 -4.195 17.758 0 -3.875 16.43 0 -5.203 16.75 0 -5.104
  [4,322,17.659,0,-4.195,17.758,0,-3.875,16.43,0,-5.203,16.75,0,-5.104],
// 4 322 17.758 0 -3.188 17.659 0 -2.868 15.423 0 -5.104 15.743 0 -5.203
  [4,322,17.758,0,-3.188,17.659,0,-2.868,15.423,0,-5.104,15.743,0,-5.203],
// 4 322 17.758 0 -3.875 17.793 0 -3.532 16.087 0 -5.238 16.43 0 -5.203
  [4,322,17.758,0,-3.875,17.793,0,-3.532,16.087,0,-5.238,16.43,0,-5.203],
// 4 322 17.793 0 -3.532 17.758 0 -3.188 15.743 0 -5.203 16.087 0 -5.238
  [4,322,17.793,0,-3.532,17.758,0,-3.188,15.743,0,-5.203,16.087,0,-5.238],
// 4 15 -15.263 0 -5.017 -15.133 0 -4.946 -17.501 0 -2.578 -17.572 0 -2.708
  [4,15,-15.263,0,-5.017,-15.133,0,-4.946,-17.501,0,-2.578,-17.572,0,-2.708],
// 4 15 -15.133 0 -4.946 -14.881 0 -4.738 -17.293 0 -2.326 -17.501 0 -2.578
  [4,15,-15.133,0,-4.946,-14.881,0,-4.738,-17.293,0,-2.326,-17.501,0,-2.578],
// 4 15 -14.881 0 -4.738 -14.672 0 -4.485 -17.04 0 -2.117 -17.293 0 -2.326
  [4,15,-14.881,0,-4.738,-14.672,0,-4.485,-17.04,0,-2.117,-17.293,0,-2.326],
// 4 15 -14.672 0 -4.485 -14.54 0 -4.242 -16.797 0 -1.985 -17.04 0 -2.117
  [4,15,-14.672,0,-4.485,-14.54,0,-4.242,-16.797,0,-1.985,-17.04,0,-2.117],
// 4 15 16.797 0 -1.985 14.54 0 -4.242 14.672 0 -4.485 17.04 0 -2.117
  [4,15,16.797,0,-1.985,14.54,0,-4.242,14.672,0,-4.485,17.04,0,-2.117],
// 4 15 17.04 0 -2.117 14.672 0 -4.485 14.881 0 -4.738 17.293 0 -2.326
  [4,15,17.04,0,-2.117,14.672,0,-4.485,14.881,0,-4.738,17.293,0,-2.326],
// 4 15 17.293 0 -2.326 14.881 0 -4.738 15.133 0 -4.946 17.501 0 -2.578
  [4,15,17.293,0,-2.326,14.881,0,-4.738,15.133,0,-4.946,17.501,0,-2.578],
// 4 15 17.501 0 -2.578 15.133 0 -4.946 15.263 0 -5.017 17.572 0 -2.708
  [4,15,17.501,0,-2.578,15.133,0,-4.946,15.263,0,-5.017,17.572,0,-2.708],
// 3 80 -18.852 0 -3.532 -19.5 0 -9.5 -18.796 0 -4.089
  [3,80,-18.852,0,-3.532,-19.5,0,-9.5,-18.796,0,-4.089],
// 4 80 -18.852 0 -3.532 -18.796 0 -2.974 -19.5 0 1.641 -19.5 0 -9.5
  [4,80,-18.852,0,-3.532,-18.796,0,-2.974,-19.5,0,1.641,-19.5,0,-9.5],
// 3 80 -18.796 0 -4.089 -19.5 0 -9.5 -18.635 0 -4.608
  [3,80,-18.796,0,-4.089,-19.5,0,-9.5,-18.635,0,-4.608],
// 3 80 -19.5 0 1.641 -18.796 0 -2.974 -18.635 0 -2.455
  [3,80,-19.5,0,1.641,-18.796,0,-2.974,-18.635,0,-2.455],
// 3 80 -18.635 0 -4.608 -19.5 0 -9.5 -18.38 0 -5.078
  [3,80,-18.635,0,-4.608,-19.5,0,-9.5,-18.38,0,-5.078],
// 3 80 -19.5 0 1.641 -18.635 0 -2.455 -18.38 0 -1.986
  [3,80,-19.5,0,1.641,-18.635,0,-2.455,-18.38,0,-1.986],
// 3 80 -18.38 0 -5.078 -19.5 0 -9.5 -18.042 0 -5.487
  [3,80,-18.38,0,-5.078,-19.5,0,-9.5,-18.042,0,-5.487],
// 3 80 -19.5 0 1.641 -18.38 0 -1.986 -18.042 0 -1.576
  [3,80,-19.5,0,1.641,-18.38,0,-1.986,-18.042,0,-1.576],
// 3 80 -18.042 0 -5.487 -19.5 0 -9.5 -17.633 0 -5.825
  [3,80,-18.042,0,-5.487,-19.5,0,-9.5,-17.633,0,-5.825],
// 3 80 -19.5 0 1.641 -18.042 0 -1.576 -17.633 0 -1.239
  [3,80,-19.5,0,1.641,-18.042,0,-1.576,-17.633,0,-1.239],
// 3 80 -17.633 0 -5.825 -19.5 0 -9.5 -17.163 0 -6.08
  [3,80,-17.633,0,-5.825,-19.5,0,-9.5,-17.163,0,-6.08],
// 3 80 -19.5 0 1.641 -17.633 0 -1.239 -17.163 0 -0.984
  [3,80,-19.5,0,1.641,-17.633,0,-1.239,-17.163,0,-0.984],
// 3 80 -17.163 0 -6.08 -19.5 0 -9.5 -16.644 0 -6.241
  [3,80,-17.163,0,-6.08,-19.5,0,-9.5,-16.644,0,-6.241],
// 3 80 -19.5 0 1.641 -17.163 0 -0.984 -16.644 0 -0.823
  [3,80,-19.5,0,1.641,-17.163,0,-0.984,-16.644,0,-0.823],
// 3 80 -19.5 0 1.641 -16.644 0 -0.823 -16.258 0 -0.775
  [3,80,-19.5,0,1.641,-16.644,0,-0.823,-16.258,0,-0.775],
// 3 80 -15.53 0 -6.241 -16.087 0 -6.297 -11.747 0 -9.5
  [3,80,-15.53,0,-6.241,-16.087,0,-6.297,-11.747,0,-9.5],
// 4 80 -16.087 0 -6.297 -16.644 0 -6.241 -19.5 0 -9.5 -11.747 0 -9.5
  [4,80,-16.087,0,-6.297,-16.644,0,-6.241,-19.5,0,-9.5,-11.747,0,-9.5],
// 3 80 -15.011 0 -6.08 -15.53 0 -6.241 -11.747 0 -9.5
  [3,80,-15.011,0,-6.08,-15.53,0,-6.241,-11.747,0,-9.5],
// 3 80 -14.541 0 -5.825 -15.011 0 -6.08 -11.747 0 -9.5
  [3,80,-14.541,0,-5.825,-15.011,0,-6.08,-11.747,0,-9.5],
// 3 80 -14.132 0 -5.487 -14.541 0 -5.825 -11.747 0 -9.5
  [3,80,-14.132,0,-5.487,-14.541,0,-5.825,-11.747,0,-9.5],
// 3 80 -13.794 0 -5.078 -14.132 0 -5.487 -11.747 0 -9.5
  [3,80,-13.794,0,-5.078,-14.132,0,-5.487,-11.747,0,-9.5],
// 3 80 -13.612 0 -4.759 -13.794 0 -5.078 -11.747 0 -9.5
  [3,80,-13.612,0,-4.759,-13.794,0,-5.078,-11.747,0,-9.5],
// 3 80 13.612 0 -4.759 11.747 0 -9.5 13.794 0 -5.078
  [3,80,13.612,0,-4.759,11.747,0,-9.5,13.794,0,-5.078],
// 3 80 13.794 0 -5.078 11.747 0 -9.5 14.132 0 -5.487
  [3,80,13.794,0,-5.078,11.747,0,-9.5,14.132,0,-5.487],
// 3 80 14.132 0 -5.487 11.747 0 -9.5 14.541 0 -5.825
  [3,80,14.132,0,-5.487,11.747,0,-9.5,14.541,0,-5.825],
// 3 80 14.541 0 -5.825 11.747 0 -9.5 15.011 0 -6.08
  [3,80,14.541,0,-5.825,11.747,0,-9.5,15.011,0,-6.08],
// 3 80 15.011 0 -6.08 11.747 0 -9.5 15.53 0 -6.241
  [3,80,15.011,0,-6.08,11.747,0,-9.5,15.53,0,-6.241],
// 3 80 15.53 0 -6.241 11.747 0 -9.5 16.087 0 -6.297
  [3,80,15.53,0,-6.241,11.747,0,-9.5,16.087,0,-6.297],
// 4 80 19.5 0 -9.5 16.644 0 -6.241 16.087 0 -6.297 11.747 0 -9.5
  [4,80,19.5,0,-9.5,16.644,0,-6.241,16.087,0,-6.297,11.747,0,-9.5],
// 3 80 17.163 0 -6.08 16.644 0 -6.241 19.5 0 -9.5
  [3,80,17.163,0,-6.08,16.644,0,-6.241,19.5,0,-9.5],
// 3 80 17.633 0 -5.825 17.163 0 -6.08 19.5 0 -9.5
  [3,80,17.633,0,-5.825,17.163,0,-6.08,19.5,0,-9.5],
// 3 80 18.042 0 -5.487 17.633 0 -5.825 19.5 0 -9.5
  [3,80,18.042,0,-5.487,17.633,0,-5.825,19.5,0,-9.5],
// 3 80 18.38 0 -5.078 18.042 0 -5.487 19.5 0 -9.5
  [3,80,18.38,0,-5.078,18.042,0,-5.487,19.5,0,-9.5],
// 3 80 18.635 0 -4.608 18.38 0 -5.078 19.5 0 -9.5
  [3,80,18.635,0,-4.608,18.38,0,-5.078,19.5,0,-9.5],
// 3 80 18.796 0 -4.089 18.635 0 -4.608 19.5 0 -9.5
  [3,80,18.796,0,-4.089,18.635,0,-4.608,19.5,0,-9.5],
// 3 80 18.852 0 -3.532 18.796 0 -4.089 19.5 0 -9.5
  [3,80,18.852,0,-3.532,18.796,0,-4.089,19.5,0,-9.5],
// 3 80 19.5 0 1.641 17.163 0 -0.984 17.633 0 -1.239
  [3,80,19.5,0,1.641,17.163,0,-0.984,17.633,0,-1.239],
// 3 80 19.5 0 1.641 17.633 0 -1.239 18.042 0 -1.576
  [3,80,19.5,0,1.641,17.633,0,-1.239,18.042,0,-1.576],
// 3 80 19.5 0 1.641 16.258 0 -0.775 16.644 0 -0.823
  [3,80,19.5,0,1.641,16.258,0,-0.775,16.644,0,-0.823],
// 3 80 19.5 0 1.641 16.644 0 -0.823 17.163 0 -0.984
  [3,80,19.5,0,1.641,16.644,0,-0.823,17.163,0,-0.984],
// 3 80 19.5 0 1.641 18.635 0 -2.455 18.796 0 -2.974
  [3,80,19.5,0,1.641,18.635,0,-2.455,18.796,0,-2.974],
// 4 80 19.5 0 1.641 18.796 0 -2.974 18.852 0 -3.532 19.5 0 -9.5
  [4,80,19.5,0,1.641,18.796,0,-2.974,18.852,0,-3.532,19.5,0,-9.5],
// 3 80 19.5 0 1.641 18.042 0 -1.576 18.38 0 -1.986
  [3,80,19.5,0,1.641,18.042,0,-1.576,18.38,0,-1.986],
// 3 80 19.5 0 1.641 18.38 0 -1.986 18.635 0 -2.455
  [3,80,19.5,0,1.641,18.38,0,-1.986,18.635,0,-2.455],
];
makepoly(ldraw_lib__3069bpz0(), line=0.2);
